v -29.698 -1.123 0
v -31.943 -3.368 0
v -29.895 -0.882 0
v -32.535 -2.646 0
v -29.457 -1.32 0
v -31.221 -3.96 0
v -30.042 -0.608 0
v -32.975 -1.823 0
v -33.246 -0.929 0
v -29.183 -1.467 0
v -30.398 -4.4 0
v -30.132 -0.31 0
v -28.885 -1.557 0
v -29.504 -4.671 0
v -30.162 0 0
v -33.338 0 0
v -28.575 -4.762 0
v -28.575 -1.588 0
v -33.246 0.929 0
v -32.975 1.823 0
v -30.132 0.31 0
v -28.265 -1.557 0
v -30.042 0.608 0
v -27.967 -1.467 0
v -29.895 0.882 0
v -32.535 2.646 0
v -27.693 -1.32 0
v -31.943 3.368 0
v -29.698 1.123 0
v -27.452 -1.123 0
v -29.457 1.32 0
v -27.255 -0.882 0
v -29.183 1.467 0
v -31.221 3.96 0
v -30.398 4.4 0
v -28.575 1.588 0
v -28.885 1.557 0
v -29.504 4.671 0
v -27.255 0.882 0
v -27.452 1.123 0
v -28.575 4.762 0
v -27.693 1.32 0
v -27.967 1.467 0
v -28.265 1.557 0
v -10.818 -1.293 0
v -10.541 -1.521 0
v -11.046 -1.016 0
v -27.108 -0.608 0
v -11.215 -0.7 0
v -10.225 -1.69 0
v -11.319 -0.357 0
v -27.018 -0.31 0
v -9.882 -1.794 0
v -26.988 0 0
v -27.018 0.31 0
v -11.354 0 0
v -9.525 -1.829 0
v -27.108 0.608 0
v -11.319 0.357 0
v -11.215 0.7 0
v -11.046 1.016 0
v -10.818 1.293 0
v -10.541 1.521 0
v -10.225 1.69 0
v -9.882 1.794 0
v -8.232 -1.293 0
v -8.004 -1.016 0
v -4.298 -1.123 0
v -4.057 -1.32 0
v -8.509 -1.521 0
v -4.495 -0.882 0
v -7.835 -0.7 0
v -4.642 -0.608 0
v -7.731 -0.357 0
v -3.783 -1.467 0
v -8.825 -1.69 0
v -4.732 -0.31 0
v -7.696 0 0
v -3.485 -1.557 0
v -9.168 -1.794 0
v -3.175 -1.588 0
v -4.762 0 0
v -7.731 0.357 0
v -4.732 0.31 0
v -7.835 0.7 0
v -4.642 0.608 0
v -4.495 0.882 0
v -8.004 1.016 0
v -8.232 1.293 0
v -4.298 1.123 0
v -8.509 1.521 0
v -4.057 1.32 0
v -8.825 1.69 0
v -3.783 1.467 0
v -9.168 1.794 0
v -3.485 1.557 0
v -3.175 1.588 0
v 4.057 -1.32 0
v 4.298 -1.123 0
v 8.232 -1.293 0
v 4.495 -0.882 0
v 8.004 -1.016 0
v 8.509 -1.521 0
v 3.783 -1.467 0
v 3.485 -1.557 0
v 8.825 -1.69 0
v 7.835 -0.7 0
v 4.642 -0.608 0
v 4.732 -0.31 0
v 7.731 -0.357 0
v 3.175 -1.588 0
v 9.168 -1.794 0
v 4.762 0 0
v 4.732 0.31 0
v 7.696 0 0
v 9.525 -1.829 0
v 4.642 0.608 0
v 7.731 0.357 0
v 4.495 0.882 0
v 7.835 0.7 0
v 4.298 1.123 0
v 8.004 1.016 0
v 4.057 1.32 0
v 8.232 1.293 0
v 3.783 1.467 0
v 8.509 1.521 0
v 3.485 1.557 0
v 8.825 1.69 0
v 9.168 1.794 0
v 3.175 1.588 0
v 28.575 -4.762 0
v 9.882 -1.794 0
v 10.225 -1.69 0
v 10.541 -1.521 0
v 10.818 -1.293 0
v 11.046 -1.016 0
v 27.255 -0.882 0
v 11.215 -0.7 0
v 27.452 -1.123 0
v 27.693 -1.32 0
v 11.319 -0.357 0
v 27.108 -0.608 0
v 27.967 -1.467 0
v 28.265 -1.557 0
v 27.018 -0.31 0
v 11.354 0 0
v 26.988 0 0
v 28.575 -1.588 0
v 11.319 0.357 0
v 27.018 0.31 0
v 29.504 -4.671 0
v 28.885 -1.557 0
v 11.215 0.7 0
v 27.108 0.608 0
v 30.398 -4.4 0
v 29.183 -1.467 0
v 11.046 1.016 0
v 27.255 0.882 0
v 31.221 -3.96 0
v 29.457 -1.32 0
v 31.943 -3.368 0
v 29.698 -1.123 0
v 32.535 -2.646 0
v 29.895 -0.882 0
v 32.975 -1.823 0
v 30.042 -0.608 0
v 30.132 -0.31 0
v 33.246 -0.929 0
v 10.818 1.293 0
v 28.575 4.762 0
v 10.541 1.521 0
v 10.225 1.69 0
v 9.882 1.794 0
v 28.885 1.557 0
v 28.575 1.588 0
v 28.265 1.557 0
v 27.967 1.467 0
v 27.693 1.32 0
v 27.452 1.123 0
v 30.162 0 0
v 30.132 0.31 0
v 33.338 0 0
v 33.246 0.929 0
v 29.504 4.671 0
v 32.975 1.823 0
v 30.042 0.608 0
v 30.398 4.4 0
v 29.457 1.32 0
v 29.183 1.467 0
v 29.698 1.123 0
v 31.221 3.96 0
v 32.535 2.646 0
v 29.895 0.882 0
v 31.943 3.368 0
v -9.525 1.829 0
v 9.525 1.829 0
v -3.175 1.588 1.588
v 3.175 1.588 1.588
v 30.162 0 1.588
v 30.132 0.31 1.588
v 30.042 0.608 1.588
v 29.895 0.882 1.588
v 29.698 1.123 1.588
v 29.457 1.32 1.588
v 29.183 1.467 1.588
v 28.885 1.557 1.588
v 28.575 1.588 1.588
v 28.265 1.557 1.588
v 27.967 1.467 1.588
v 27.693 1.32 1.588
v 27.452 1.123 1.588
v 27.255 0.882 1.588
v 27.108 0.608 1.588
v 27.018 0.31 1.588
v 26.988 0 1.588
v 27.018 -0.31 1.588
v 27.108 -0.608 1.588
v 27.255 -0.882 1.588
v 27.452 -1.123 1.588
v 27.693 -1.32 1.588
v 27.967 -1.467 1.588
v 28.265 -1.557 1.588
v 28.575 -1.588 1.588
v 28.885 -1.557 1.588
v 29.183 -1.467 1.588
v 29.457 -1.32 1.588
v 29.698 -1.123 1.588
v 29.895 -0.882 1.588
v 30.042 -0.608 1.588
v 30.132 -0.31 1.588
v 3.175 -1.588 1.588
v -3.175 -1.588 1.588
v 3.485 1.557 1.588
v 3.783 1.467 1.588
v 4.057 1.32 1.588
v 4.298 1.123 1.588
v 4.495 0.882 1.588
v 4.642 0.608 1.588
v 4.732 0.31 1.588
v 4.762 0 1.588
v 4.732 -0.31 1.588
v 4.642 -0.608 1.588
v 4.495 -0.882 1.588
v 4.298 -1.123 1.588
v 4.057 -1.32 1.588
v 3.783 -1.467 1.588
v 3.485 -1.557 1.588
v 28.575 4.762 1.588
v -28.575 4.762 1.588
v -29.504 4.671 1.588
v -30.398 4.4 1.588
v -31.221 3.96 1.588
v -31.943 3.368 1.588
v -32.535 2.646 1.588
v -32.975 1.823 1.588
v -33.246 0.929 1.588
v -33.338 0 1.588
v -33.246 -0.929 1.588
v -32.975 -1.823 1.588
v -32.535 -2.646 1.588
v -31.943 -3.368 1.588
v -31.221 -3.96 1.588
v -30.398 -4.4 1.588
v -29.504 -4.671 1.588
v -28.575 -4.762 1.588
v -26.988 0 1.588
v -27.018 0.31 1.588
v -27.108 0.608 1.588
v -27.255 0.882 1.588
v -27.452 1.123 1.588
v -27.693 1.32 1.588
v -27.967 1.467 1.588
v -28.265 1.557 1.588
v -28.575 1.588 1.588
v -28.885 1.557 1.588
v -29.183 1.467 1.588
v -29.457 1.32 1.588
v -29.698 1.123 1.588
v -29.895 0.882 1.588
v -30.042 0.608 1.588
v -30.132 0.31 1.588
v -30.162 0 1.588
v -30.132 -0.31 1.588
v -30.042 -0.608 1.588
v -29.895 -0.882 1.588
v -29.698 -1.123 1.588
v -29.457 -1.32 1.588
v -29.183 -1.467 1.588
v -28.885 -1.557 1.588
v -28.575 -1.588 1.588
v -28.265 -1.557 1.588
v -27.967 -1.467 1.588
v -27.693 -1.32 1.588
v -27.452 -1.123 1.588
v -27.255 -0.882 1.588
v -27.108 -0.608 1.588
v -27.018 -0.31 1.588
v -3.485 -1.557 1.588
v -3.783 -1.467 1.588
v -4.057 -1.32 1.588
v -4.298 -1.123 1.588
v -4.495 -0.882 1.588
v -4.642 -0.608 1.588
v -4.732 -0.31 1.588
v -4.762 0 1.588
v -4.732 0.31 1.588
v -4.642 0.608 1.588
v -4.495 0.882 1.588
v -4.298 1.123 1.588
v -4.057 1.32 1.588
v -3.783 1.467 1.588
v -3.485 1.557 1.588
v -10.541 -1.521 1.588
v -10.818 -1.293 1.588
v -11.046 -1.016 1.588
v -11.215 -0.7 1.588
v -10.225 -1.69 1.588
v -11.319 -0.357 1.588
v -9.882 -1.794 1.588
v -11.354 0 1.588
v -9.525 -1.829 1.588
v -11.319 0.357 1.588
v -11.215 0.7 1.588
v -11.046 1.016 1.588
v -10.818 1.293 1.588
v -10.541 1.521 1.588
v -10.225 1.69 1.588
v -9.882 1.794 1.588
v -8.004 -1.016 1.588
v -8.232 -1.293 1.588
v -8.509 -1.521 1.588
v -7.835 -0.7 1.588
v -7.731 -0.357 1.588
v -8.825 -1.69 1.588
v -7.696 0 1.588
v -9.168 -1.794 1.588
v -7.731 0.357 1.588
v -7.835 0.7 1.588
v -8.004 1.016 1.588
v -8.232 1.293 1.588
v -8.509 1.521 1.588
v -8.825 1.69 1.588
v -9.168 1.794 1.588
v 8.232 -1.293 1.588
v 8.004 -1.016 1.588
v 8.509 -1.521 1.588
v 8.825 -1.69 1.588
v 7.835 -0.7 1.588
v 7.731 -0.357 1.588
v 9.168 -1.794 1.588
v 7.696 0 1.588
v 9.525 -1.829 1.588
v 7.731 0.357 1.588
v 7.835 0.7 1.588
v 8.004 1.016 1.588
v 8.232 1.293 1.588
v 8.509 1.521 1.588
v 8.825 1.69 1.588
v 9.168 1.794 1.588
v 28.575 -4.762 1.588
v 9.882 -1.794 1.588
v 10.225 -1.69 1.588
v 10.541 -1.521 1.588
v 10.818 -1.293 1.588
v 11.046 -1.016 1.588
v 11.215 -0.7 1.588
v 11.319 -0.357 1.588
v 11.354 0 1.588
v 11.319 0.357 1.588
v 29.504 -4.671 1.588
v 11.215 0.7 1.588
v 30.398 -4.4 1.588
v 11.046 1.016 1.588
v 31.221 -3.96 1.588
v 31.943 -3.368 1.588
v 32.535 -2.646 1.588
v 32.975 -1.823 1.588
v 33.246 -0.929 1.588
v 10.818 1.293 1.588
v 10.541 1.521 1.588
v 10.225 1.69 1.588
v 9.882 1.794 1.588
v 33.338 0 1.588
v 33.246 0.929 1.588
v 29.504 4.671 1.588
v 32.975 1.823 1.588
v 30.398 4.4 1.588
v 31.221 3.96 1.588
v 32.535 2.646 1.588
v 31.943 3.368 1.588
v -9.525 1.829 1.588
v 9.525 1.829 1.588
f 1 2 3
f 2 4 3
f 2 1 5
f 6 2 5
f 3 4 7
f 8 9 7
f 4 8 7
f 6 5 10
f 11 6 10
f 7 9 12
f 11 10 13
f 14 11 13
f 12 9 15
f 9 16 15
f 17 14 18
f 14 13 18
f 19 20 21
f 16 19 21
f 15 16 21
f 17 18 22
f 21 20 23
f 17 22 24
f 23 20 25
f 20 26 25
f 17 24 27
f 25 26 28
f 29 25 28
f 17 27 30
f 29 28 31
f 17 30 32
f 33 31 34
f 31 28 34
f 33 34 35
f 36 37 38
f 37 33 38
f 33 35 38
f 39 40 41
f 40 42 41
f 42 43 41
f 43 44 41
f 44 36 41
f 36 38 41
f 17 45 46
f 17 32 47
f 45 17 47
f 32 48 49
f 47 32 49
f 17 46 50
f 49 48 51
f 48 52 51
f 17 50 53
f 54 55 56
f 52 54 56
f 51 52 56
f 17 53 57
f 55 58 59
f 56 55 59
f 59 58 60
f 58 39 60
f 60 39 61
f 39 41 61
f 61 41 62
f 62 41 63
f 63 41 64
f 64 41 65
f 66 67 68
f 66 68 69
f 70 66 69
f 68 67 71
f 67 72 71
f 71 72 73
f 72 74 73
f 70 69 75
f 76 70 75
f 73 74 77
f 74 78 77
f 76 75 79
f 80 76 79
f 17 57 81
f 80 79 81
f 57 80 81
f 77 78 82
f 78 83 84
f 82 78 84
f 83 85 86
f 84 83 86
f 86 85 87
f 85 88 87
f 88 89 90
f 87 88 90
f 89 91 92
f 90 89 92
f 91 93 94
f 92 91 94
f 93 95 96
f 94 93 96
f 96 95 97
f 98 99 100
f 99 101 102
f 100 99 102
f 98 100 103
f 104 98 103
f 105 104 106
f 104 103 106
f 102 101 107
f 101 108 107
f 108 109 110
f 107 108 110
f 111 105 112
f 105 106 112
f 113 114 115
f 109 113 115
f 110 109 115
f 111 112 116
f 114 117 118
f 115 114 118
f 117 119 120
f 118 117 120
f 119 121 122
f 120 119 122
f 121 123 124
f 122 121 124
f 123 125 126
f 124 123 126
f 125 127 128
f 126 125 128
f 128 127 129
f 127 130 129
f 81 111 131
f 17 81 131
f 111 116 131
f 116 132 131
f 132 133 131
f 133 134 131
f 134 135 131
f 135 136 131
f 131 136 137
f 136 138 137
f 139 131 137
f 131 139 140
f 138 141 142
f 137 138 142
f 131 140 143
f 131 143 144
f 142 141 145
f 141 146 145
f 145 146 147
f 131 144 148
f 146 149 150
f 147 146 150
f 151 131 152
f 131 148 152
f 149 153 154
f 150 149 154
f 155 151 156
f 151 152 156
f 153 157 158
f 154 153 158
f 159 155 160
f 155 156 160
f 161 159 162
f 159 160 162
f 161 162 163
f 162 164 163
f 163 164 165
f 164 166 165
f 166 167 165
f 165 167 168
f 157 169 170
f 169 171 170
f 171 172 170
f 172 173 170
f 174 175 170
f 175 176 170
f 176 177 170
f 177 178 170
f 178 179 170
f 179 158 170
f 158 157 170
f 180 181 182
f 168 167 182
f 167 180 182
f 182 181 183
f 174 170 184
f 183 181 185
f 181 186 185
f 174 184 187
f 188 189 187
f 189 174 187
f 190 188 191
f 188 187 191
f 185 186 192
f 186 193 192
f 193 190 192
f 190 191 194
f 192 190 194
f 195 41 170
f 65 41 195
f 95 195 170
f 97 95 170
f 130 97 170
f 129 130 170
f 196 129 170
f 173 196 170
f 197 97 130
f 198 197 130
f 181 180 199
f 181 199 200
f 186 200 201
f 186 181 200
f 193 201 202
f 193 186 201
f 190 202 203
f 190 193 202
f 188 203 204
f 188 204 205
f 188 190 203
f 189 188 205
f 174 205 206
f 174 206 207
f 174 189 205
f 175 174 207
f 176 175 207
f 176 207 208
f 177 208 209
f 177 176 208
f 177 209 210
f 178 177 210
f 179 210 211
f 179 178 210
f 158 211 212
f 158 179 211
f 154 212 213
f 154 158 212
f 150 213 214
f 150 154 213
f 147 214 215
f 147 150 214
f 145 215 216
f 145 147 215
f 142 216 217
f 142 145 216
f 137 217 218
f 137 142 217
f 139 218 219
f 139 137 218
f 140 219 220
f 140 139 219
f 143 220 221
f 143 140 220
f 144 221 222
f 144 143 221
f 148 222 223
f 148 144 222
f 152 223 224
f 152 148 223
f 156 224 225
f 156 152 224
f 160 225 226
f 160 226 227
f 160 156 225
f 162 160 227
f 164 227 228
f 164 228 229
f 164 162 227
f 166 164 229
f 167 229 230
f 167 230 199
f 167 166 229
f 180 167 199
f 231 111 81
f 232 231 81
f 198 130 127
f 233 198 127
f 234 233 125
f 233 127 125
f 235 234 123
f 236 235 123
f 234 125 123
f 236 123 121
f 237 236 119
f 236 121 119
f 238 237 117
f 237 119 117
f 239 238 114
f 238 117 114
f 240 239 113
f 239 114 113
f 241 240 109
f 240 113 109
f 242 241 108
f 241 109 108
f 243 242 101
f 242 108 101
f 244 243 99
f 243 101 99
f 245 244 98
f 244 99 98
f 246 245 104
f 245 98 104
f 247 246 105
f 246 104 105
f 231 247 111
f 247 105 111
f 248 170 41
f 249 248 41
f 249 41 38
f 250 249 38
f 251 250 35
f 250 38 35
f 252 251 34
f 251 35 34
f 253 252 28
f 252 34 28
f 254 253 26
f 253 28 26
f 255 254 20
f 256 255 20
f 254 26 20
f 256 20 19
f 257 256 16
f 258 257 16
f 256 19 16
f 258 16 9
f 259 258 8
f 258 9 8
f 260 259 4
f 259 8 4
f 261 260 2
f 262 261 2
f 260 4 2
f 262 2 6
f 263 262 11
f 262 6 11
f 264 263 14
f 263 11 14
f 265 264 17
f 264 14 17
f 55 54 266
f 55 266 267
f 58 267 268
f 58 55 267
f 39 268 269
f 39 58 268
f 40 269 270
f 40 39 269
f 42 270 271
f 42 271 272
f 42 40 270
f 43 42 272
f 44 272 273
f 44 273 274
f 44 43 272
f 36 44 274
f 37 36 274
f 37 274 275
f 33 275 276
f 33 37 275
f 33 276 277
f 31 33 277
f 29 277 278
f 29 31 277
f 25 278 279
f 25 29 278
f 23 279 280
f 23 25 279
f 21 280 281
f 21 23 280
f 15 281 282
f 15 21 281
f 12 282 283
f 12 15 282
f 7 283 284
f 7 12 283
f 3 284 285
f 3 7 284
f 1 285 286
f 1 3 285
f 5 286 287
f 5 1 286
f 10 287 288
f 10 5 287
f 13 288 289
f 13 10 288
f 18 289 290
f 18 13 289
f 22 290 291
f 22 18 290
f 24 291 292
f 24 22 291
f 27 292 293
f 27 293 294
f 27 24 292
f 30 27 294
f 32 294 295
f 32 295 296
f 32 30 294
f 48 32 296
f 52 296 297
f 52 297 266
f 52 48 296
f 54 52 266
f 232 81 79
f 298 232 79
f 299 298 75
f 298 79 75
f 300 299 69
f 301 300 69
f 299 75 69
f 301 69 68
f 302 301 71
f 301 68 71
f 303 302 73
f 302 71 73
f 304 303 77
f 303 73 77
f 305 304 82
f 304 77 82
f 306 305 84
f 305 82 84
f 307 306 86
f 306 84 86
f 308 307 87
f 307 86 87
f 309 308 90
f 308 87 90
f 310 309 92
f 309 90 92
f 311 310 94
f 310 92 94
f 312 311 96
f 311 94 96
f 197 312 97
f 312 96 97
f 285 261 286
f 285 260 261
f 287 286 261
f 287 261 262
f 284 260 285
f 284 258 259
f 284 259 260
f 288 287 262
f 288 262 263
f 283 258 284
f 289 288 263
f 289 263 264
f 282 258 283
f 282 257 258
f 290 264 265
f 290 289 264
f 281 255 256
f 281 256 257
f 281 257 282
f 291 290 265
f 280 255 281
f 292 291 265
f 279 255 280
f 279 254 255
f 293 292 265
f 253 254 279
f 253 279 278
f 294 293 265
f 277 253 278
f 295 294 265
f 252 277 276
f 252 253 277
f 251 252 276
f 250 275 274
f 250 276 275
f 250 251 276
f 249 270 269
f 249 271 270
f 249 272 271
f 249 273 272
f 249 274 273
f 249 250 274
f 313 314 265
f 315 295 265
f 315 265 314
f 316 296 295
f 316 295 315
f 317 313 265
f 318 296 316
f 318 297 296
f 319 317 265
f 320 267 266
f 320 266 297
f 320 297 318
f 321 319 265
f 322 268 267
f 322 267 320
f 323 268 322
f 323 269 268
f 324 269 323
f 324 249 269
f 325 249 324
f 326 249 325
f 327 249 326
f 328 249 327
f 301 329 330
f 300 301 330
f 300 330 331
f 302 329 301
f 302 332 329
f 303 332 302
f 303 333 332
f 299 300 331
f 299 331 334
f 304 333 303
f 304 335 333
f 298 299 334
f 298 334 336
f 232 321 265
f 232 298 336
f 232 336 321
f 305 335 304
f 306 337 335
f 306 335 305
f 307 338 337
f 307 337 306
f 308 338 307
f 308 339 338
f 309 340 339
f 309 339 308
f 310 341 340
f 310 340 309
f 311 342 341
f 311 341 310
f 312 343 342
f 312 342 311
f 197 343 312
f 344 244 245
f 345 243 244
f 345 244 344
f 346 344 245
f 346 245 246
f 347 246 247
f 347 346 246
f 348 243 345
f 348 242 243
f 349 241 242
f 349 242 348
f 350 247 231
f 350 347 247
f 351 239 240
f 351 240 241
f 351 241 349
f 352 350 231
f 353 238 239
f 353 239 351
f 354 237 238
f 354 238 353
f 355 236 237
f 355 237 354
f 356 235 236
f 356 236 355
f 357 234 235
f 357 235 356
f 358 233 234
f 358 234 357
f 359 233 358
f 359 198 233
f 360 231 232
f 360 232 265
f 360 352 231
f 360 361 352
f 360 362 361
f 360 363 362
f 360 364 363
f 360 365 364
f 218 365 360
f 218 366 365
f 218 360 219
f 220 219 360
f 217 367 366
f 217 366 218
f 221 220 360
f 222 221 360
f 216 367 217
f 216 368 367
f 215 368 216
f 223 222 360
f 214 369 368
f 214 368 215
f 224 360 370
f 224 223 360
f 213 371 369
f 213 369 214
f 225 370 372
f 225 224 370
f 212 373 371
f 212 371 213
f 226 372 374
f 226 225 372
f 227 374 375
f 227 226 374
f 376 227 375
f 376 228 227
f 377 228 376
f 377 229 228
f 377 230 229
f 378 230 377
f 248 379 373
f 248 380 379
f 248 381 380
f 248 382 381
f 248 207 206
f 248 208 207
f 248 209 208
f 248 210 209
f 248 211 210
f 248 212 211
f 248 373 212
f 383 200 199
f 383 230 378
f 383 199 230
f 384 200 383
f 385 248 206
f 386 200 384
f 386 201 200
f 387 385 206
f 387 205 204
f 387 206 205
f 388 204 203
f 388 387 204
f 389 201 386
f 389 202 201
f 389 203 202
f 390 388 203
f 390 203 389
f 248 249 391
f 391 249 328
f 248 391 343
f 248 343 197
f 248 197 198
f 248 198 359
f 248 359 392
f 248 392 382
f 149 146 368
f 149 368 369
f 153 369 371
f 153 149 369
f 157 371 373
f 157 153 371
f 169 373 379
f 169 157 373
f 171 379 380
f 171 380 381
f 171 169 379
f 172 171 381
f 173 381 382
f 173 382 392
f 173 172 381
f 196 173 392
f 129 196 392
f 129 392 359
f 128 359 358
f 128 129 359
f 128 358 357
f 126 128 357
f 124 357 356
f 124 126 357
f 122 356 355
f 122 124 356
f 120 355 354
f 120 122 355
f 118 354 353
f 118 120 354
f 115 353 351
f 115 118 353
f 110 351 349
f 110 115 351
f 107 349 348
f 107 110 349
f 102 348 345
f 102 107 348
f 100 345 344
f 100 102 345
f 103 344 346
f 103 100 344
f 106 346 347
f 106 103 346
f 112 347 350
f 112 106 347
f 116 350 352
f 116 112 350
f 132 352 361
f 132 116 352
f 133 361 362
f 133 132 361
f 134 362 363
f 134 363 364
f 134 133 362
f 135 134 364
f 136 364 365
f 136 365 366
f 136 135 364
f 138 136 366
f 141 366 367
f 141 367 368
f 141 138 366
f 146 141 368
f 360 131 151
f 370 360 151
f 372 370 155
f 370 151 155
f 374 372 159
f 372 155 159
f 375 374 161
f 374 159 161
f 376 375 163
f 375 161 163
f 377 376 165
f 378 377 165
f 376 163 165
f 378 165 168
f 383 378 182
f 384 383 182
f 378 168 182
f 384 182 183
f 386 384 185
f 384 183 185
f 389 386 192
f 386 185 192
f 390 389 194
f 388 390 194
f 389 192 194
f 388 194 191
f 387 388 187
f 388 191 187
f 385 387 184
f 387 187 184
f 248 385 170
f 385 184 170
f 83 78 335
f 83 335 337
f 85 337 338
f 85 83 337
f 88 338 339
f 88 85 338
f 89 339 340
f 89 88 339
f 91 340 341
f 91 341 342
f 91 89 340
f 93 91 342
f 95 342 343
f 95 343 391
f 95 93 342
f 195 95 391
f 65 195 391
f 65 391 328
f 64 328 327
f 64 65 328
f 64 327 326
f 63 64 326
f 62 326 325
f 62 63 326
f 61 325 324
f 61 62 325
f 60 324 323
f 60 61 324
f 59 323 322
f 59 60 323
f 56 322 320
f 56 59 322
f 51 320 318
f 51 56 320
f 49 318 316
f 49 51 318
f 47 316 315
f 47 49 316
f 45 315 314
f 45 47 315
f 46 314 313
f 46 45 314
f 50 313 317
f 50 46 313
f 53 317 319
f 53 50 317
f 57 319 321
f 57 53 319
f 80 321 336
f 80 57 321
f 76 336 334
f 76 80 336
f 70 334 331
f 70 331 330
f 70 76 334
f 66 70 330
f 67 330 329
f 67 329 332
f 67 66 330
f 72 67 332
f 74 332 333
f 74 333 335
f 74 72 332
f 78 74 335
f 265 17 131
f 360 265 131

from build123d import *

# Parameters (mm, degrees)
F0_R     = 1.5875
F0_R_2   = 1.8288
F1_DEPTH = 1.5875


with BuildPart() as f1:
    # F0 (on Top) → F1 (new body)
    with BuildSketch(Plane.XY):
        with BuildLine():
            ThreePointArc((28.575, -4.7625), (33.3375, 0), (28.575, 4.7625))
            Line((28.575, 4.7625), (-28.575, 4.7625))
            ThreePointArc((-28.575, 4.7625), (-33.3375, 0), (-28.575, -4.7625))
            Line((-28.575, -4.7625), (28.575, -4.7625))
        make_face()
        with Locations((-28.575, 0)):
            Circle(F0_R, mode=Mode.SUBTRACT)
        with Locations((-9.525, 0)):
            Circle(F0_R_2, mode=Mode.SUBTRACT)
        with BuildLine():
            ThreePointArc((3.175, 1.5875), (4.7625, 0), (3.175, -1.5875))
            Line((3.175, -1.5875), (-3.175, -1.5875))
            ThreePointArc((-3.175, -1.5875), (-4.7625, 0), (-3.175, 1.5875))
            Line((-3.175, 1.5875), (3.175, 1.5875))
        make_face(mode=Mode.SUBTRACT)
        with Locations((9.525, 0)):
            Circle(F0_R_2, mode=Mode.SUBTRACT)
        with Locations((28.575, 0)):
            Circle(F0_R, mode=Mode.SUBTRACT)
    extrude(amount=F1_DEPTH)


solid = f1.part
